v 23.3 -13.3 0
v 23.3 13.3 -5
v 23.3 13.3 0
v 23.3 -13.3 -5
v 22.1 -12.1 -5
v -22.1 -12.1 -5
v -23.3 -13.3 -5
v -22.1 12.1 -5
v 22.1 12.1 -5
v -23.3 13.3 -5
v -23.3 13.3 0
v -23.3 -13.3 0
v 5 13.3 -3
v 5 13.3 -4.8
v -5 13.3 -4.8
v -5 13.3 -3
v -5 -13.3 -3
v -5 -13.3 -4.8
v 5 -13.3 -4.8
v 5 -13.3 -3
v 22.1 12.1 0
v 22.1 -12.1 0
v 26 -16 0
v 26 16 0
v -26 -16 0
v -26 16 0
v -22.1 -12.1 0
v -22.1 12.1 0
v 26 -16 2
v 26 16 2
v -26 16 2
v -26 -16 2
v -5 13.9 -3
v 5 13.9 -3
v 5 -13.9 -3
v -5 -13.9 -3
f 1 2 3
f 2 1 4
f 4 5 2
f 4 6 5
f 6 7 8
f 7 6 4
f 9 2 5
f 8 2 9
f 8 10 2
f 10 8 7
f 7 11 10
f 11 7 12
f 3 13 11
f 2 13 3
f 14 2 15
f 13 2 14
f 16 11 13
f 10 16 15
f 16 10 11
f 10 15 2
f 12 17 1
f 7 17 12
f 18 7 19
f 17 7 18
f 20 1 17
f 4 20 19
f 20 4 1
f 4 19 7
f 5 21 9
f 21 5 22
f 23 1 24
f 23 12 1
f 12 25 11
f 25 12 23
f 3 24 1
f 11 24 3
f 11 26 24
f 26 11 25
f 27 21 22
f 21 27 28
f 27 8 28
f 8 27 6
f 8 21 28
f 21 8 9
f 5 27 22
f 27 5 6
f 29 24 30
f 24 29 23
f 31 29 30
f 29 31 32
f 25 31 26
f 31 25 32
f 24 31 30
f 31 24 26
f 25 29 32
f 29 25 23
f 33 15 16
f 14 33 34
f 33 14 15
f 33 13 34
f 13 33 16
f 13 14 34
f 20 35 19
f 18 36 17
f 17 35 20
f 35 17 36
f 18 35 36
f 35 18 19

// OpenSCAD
// Snap-fit lid for 50x30 box, 1.5 mm walls, PETG, FDM (0.4 nozzle).
// Assumptions: box inner cavity 47x27; box has a matching shallow 0.5 mm groove
// in the inner wall ~3 mm below the top edge for the hooks to catch.
plate_x = 52; plate_y = 32; plate_t = 2;   // 1 mm overhang each side
clr = 0.2;                                  // clearance per side to inner wall
rim_wall = 1.2; rim_h = 5;                  // locating rim depth below plate
rim_x = 47 - 2*clr; rim_y = 27 - 2*clr;     // 46.6 x 26.6
hook_w = 10; hook_out = 0.6;                // hook width and protrusion
hook_top = 3;                               // catch face 3 mm below plate underside

// plate, top at z=plate_t, underside at z=0
translate([-plate_x/2, -plate_y/2, 0]) cube([plate_x, plate_y, plate_t]);

// rim
translate([0,0,-rim_h])
difference() {
  translate([-rim_x/2, -rim_y/2, 0]) cube([rim_x, rim_y, rim_h + 0.01]);
  translate([-rim_x/2+rim_wall, -rim_y/2+rim_wall, -1])
    cube([rim_x-2*rim_wall, rim_y-2*rim_wall, rim_h+1]);
}

// hooks on both long sides: flat catch face on top, ramp below for lead-in
module hook() {
  translate([0, rim_y/2, 0])
    rotate([90,0,90]) linear_extrude(hook_w, center=true)
      polygon([[-0.3,-hook_top],[hook_out,-hook_top],[0,-rim_h+0.2],[-0.3,-rim_h+0.2]]);
}
hook();
mirror([0,1,0]) hook();
